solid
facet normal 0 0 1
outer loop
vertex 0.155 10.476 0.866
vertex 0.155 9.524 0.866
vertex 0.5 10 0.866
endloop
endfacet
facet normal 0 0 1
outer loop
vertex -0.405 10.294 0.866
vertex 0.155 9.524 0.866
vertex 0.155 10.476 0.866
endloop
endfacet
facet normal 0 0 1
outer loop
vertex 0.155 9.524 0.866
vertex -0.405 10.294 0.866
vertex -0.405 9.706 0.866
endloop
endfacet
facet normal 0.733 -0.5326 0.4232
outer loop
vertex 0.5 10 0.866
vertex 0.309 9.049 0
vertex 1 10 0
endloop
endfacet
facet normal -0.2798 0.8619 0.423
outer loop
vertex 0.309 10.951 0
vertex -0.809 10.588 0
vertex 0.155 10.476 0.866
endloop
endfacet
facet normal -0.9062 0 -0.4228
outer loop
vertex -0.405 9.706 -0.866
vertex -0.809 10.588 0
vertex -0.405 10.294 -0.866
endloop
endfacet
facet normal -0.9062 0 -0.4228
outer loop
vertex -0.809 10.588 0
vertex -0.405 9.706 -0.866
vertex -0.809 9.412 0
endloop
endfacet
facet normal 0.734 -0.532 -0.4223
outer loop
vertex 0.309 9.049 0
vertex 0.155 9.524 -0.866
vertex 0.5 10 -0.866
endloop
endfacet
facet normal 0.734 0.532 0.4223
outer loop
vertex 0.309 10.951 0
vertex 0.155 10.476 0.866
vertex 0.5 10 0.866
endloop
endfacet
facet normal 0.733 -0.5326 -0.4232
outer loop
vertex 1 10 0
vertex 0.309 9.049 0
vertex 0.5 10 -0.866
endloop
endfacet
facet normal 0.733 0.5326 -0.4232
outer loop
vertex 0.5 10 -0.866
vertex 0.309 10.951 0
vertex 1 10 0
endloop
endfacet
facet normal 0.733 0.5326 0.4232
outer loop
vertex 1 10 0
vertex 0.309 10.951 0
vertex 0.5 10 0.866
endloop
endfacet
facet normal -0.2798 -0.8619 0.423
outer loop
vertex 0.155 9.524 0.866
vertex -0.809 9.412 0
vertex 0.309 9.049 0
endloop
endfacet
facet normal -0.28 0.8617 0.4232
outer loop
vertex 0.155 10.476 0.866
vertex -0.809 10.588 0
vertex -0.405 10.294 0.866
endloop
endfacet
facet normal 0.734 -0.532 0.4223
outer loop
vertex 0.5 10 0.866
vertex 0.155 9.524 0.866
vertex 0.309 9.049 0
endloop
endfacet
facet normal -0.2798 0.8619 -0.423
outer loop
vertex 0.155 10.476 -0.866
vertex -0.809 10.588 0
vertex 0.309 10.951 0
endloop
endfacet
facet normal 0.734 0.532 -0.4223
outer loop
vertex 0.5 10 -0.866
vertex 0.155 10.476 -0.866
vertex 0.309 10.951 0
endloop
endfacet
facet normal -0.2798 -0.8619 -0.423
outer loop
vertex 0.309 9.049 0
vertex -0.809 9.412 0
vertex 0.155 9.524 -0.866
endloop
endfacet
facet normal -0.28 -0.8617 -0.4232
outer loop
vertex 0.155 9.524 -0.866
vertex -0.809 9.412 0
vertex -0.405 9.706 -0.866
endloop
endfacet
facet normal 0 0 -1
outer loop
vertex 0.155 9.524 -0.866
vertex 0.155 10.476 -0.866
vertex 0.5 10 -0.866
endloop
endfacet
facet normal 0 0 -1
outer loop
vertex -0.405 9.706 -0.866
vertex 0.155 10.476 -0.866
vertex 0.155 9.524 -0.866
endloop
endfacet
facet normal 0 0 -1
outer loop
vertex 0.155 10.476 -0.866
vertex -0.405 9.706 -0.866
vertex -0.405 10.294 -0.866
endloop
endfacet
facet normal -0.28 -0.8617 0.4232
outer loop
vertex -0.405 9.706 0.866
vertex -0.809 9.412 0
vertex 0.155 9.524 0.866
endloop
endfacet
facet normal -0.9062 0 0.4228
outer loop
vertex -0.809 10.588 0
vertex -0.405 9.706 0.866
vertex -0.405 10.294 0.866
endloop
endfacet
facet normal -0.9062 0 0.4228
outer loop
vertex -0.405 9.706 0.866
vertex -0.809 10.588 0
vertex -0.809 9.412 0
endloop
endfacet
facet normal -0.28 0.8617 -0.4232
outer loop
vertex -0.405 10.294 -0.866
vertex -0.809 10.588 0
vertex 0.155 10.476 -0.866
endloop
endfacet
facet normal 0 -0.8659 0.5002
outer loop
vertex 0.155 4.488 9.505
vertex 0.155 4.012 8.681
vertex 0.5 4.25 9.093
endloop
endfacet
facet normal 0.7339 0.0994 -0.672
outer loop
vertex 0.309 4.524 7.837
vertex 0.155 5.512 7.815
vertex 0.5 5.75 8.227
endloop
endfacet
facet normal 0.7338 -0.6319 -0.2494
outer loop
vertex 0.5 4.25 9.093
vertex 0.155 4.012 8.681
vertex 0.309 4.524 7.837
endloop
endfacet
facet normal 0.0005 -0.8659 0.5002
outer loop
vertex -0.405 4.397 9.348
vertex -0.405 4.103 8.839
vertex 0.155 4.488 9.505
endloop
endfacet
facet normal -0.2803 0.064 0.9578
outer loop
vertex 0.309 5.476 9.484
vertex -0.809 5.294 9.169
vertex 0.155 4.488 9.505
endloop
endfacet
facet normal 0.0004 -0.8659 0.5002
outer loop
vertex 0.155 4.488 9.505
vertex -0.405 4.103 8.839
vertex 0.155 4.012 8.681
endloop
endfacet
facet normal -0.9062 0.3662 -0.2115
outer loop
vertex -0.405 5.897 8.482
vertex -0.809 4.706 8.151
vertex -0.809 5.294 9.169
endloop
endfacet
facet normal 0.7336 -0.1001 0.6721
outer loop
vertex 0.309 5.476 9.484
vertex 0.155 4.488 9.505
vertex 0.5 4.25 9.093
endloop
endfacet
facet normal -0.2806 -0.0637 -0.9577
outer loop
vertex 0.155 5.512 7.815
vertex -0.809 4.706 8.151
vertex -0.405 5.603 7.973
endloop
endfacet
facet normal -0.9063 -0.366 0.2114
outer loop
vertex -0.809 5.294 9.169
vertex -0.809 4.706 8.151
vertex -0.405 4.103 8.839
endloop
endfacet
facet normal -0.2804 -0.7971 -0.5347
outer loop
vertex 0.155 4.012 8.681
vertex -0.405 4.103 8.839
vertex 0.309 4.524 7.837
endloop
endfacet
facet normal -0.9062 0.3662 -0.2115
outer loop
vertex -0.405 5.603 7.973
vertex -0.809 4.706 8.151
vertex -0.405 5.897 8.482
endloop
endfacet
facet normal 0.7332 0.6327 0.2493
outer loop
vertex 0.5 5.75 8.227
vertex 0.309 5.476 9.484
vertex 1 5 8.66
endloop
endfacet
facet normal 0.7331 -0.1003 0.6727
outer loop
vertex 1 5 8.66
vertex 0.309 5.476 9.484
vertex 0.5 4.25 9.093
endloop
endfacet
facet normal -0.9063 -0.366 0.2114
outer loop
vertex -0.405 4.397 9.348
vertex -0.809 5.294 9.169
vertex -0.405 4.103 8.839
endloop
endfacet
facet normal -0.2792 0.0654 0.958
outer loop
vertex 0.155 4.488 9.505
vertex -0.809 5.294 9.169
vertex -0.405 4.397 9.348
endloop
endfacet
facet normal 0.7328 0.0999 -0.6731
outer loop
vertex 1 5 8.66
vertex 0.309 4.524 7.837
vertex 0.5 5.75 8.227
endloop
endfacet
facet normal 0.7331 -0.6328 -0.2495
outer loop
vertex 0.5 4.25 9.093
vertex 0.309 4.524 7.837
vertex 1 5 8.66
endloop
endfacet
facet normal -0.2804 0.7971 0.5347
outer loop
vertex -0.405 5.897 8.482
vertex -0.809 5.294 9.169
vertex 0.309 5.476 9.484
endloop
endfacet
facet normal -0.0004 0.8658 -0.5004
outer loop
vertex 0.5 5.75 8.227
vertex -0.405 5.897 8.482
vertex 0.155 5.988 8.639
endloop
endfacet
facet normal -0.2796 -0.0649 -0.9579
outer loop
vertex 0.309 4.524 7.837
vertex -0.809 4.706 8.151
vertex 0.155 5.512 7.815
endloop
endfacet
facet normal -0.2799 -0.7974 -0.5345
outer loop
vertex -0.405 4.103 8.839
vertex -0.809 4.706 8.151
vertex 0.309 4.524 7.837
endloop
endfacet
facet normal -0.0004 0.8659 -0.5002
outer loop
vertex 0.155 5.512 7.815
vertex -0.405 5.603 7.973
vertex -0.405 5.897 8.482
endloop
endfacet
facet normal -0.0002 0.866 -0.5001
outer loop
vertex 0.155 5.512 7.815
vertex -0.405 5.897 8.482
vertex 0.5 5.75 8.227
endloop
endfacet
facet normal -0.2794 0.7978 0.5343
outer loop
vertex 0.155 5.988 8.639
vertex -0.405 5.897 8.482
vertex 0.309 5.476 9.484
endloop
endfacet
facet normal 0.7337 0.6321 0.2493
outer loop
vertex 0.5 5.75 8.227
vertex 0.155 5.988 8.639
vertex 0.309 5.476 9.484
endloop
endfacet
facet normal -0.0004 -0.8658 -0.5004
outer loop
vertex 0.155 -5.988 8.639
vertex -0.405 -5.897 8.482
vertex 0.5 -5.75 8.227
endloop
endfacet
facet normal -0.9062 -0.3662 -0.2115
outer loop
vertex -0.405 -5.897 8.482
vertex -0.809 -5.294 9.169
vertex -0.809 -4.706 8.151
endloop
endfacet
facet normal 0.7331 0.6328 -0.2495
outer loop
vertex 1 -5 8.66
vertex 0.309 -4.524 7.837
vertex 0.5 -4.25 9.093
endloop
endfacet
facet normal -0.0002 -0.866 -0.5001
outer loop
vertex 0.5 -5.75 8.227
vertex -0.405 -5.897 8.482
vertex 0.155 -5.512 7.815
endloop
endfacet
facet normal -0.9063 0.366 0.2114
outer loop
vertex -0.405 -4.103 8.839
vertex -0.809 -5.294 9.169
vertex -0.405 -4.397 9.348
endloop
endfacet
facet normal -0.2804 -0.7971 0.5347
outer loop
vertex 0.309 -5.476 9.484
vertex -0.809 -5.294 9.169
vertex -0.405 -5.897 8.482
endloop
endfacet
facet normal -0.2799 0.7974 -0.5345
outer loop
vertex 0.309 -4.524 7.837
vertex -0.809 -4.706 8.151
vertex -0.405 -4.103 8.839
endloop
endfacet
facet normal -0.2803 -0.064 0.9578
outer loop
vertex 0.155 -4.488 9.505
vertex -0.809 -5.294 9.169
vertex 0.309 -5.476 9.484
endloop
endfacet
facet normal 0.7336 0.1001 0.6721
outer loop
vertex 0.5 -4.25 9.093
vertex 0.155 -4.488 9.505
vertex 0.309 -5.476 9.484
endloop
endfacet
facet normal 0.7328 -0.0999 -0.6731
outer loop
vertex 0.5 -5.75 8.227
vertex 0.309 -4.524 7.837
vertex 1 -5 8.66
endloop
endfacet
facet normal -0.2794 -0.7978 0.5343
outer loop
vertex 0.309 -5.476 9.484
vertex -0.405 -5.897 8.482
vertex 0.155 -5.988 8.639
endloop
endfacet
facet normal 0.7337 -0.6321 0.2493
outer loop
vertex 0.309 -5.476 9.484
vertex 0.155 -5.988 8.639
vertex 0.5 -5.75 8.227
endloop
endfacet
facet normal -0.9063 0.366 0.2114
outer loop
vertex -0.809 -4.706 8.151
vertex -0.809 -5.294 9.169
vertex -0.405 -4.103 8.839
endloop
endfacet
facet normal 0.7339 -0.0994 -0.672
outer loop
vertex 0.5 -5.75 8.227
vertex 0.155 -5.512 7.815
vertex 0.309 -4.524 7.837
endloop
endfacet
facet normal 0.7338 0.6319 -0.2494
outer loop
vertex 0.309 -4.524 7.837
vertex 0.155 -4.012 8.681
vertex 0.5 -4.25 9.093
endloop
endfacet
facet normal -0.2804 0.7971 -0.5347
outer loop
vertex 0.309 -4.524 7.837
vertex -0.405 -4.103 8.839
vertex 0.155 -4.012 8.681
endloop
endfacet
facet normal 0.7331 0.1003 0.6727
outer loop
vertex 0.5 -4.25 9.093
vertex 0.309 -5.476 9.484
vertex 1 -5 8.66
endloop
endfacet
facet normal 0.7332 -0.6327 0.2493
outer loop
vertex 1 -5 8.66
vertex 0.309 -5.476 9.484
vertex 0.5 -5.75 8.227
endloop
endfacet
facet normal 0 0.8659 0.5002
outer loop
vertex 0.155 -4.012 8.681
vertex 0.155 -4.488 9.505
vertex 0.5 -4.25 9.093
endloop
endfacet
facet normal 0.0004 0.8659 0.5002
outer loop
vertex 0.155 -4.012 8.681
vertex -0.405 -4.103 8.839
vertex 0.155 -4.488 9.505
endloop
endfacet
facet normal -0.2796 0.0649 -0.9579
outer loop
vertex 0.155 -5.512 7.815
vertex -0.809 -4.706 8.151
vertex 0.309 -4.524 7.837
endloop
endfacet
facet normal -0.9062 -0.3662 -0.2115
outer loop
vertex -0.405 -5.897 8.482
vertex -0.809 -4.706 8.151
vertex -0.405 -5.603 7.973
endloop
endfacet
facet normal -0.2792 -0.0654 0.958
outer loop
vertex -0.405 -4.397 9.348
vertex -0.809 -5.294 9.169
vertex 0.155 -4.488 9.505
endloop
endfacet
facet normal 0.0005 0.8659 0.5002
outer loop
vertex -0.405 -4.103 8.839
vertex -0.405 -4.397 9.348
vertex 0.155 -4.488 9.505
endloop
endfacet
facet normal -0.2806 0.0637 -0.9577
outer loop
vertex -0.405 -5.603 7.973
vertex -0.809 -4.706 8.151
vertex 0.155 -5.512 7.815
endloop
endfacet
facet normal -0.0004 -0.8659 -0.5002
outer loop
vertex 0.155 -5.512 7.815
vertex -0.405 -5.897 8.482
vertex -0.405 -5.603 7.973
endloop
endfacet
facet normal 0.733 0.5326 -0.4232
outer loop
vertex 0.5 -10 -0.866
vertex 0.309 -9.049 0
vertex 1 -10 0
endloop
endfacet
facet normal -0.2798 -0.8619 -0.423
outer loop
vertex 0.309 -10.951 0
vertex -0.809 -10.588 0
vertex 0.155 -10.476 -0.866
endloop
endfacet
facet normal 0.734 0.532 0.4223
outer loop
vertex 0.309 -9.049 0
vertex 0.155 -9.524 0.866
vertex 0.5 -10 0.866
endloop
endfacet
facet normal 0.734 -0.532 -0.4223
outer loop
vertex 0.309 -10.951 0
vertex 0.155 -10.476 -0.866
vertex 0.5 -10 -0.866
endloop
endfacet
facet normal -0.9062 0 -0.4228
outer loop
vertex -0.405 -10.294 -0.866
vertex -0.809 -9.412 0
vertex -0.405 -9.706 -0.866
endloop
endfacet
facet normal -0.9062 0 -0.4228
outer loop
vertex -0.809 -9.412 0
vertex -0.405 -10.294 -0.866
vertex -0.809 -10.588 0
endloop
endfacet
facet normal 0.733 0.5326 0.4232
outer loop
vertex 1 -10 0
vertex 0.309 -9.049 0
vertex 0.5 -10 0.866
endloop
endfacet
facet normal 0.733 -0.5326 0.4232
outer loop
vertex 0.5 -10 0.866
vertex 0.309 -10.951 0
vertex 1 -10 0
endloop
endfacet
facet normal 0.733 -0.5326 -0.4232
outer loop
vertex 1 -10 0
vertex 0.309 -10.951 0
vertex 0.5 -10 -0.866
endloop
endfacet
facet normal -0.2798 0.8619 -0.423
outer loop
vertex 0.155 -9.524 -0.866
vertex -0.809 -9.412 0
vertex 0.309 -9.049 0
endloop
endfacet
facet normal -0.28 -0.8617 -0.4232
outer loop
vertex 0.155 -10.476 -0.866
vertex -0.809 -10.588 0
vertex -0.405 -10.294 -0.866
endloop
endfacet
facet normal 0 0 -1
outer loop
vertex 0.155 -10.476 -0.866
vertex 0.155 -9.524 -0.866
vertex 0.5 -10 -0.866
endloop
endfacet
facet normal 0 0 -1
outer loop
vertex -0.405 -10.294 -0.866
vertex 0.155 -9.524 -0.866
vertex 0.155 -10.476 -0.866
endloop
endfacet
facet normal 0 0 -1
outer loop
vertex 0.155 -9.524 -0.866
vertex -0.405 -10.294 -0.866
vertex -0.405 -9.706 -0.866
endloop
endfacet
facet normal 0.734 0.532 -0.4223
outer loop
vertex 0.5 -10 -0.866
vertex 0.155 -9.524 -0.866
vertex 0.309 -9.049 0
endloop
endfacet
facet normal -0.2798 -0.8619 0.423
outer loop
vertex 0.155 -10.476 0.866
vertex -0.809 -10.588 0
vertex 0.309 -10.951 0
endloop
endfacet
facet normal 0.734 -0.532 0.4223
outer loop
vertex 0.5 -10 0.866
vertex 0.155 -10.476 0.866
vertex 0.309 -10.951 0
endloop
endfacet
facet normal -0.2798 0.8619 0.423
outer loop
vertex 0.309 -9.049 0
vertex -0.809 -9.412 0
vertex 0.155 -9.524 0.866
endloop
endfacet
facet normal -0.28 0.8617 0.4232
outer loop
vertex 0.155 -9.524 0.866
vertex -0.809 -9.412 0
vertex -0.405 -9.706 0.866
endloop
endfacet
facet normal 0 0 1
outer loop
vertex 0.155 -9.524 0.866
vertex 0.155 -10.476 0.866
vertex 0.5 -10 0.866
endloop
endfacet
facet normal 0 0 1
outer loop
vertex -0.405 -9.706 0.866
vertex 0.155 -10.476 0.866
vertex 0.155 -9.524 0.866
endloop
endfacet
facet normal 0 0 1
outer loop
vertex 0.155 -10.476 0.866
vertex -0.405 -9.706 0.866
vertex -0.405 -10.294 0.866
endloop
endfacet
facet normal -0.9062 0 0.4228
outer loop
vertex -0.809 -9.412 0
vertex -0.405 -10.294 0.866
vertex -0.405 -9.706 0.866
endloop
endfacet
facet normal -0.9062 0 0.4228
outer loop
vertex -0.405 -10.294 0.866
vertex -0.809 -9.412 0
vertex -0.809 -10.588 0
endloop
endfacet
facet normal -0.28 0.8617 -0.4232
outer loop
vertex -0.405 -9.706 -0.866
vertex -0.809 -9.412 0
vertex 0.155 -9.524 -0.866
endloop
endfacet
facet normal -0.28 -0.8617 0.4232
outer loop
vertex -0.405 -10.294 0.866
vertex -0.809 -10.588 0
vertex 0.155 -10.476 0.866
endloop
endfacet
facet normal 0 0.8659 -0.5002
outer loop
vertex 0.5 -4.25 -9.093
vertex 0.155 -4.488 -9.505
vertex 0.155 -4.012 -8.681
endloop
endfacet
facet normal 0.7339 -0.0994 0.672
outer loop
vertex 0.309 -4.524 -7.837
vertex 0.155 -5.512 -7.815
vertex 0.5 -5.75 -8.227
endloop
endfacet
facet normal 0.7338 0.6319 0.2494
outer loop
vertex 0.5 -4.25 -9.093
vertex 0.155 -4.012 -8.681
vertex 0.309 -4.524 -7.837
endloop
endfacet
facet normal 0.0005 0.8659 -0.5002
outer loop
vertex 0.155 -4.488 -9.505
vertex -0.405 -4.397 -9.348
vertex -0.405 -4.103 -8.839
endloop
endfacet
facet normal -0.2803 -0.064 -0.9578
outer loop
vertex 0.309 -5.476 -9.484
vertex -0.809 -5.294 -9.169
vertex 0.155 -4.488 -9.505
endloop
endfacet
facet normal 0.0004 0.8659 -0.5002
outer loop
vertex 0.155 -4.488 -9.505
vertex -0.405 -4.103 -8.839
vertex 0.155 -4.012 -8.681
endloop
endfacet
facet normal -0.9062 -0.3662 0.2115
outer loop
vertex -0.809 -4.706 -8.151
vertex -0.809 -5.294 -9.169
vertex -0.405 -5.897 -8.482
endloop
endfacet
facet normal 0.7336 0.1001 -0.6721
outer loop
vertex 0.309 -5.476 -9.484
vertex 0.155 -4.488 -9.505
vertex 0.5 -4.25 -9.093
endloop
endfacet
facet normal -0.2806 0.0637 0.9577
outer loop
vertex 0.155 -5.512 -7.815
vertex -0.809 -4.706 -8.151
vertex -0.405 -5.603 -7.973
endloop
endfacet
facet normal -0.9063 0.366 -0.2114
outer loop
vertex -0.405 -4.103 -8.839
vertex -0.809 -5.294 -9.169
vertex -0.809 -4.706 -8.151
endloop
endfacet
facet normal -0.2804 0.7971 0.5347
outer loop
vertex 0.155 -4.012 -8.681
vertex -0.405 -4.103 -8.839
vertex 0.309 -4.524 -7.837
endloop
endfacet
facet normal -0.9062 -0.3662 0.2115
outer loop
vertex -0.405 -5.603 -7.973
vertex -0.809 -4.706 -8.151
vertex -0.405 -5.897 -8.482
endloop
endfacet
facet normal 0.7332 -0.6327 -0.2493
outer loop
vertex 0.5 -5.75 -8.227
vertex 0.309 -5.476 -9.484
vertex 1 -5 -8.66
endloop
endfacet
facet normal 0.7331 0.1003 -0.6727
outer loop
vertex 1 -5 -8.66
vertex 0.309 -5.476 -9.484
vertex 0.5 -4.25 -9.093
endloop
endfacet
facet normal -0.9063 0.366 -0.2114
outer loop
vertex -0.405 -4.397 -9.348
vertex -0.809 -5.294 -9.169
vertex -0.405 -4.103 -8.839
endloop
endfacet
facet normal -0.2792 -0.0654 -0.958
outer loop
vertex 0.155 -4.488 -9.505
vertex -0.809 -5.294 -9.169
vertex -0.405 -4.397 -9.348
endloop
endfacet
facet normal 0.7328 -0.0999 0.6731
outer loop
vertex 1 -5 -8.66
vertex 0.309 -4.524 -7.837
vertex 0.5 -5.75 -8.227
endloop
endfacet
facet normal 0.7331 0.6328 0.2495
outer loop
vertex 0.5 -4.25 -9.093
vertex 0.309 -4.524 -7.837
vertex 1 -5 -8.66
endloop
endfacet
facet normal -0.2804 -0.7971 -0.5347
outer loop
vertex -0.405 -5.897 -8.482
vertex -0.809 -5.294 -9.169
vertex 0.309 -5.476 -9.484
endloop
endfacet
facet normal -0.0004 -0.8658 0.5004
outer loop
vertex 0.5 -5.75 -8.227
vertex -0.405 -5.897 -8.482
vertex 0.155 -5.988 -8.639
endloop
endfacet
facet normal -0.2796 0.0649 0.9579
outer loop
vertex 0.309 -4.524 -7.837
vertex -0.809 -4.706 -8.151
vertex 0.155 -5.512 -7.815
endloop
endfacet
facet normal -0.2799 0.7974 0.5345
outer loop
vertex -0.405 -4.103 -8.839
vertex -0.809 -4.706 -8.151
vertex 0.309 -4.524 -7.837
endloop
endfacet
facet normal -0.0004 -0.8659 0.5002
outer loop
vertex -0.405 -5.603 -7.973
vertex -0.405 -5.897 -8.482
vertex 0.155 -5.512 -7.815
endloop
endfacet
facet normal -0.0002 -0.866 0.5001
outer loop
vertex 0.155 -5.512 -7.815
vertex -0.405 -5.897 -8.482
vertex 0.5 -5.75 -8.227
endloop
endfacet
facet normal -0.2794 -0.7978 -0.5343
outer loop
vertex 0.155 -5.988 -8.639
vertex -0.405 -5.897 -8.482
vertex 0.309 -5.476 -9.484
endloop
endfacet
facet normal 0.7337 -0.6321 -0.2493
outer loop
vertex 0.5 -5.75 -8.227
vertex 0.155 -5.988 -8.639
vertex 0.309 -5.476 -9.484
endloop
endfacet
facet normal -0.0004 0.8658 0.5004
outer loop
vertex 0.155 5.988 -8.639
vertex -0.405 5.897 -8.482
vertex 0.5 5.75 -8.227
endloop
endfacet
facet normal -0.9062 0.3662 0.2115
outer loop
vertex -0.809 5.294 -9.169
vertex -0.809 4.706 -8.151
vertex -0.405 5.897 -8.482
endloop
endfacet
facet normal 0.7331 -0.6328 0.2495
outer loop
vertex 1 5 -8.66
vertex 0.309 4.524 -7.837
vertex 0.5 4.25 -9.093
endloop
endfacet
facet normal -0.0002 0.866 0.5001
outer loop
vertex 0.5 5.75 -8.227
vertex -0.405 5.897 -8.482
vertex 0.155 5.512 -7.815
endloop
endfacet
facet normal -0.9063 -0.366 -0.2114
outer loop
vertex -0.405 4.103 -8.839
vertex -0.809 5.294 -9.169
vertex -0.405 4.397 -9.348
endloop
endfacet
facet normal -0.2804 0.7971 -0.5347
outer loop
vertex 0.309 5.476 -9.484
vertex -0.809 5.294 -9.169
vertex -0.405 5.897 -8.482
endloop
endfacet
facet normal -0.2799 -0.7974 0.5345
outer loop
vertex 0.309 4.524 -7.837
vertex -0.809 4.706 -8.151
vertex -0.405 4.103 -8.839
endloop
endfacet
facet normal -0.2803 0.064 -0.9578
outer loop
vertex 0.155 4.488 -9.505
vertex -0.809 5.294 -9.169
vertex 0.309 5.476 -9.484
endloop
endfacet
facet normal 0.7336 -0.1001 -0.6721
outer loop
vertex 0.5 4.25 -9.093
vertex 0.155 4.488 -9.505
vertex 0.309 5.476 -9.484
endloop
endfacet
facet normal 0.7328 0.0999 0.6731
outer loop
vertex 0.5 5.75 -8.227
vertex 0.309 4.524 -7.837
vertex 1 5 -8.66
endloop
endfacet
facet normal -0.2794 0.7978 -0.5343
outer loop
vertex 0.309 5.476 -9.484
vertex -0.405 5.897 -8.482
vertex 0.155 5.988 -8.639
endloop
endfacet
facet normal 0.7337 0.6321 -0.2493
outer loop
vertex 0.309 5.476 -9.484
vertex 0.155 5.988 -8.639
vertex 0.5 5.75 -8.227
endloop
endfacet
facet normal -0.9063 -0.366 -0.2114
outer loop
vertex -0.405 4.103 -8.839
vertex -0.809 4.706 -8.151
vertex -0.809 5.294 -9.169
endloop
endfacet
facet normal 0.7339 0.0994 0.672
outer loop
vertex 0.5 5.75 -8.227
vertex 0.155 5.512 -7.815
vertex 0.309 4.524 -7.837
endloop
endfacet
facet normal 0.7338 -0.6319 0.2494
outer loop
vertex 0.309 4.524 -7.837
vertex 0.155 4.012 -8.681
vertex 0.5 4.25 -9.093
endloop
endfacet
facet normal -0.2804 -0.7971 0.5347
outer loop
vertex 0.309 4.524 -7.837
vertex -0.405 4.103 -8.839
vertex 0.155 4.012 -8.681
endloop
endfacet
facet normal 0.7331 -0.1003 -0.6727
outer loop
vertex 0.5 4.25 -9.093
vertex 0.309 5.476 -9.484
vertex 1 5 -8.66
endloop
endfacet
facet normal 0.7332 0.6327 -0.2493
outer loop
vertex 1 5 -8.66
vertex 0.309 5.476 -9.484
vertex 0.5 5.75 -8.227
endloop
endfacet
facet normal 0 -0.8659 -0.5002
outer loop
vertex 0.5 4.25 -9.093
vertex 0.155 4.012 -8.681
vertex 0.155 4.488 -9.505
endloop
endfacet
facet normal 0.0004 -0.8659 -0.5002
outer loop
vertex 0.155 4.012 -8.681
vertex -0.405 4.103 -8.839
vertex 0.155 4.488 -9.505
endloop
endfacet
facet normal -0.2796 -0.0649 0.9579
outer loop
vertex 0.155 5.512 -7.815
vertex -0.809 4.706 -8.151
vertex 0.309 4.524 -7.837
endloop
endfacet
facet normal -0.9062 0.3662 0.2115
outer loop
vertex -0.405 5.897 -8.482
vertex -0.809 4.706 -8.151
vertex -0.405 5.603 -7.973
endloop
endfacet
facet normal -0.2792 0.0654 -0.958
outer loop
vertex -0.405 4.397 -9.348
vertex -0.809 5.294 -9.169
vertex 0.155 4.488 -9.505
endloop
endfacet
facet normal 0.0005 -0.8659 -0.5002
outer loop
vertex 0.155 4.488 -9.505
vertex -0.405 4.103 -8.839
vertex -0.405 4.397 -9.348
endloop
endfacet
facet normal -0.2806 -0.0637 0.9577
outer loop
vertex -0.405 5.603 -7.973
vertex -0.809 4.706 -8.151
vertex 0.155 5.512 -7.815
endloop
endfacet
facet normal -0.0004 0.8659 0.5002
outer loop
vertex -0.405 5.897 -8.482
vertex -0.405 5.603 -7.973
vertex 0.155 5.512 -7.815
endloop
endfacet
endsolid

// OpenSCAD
for ( i = [0 : 5] )
{
    rotate( i * 360 / 6, [1, 0, 0])
    translate([0, 10, 0])
    sphere(r = 1);
}
